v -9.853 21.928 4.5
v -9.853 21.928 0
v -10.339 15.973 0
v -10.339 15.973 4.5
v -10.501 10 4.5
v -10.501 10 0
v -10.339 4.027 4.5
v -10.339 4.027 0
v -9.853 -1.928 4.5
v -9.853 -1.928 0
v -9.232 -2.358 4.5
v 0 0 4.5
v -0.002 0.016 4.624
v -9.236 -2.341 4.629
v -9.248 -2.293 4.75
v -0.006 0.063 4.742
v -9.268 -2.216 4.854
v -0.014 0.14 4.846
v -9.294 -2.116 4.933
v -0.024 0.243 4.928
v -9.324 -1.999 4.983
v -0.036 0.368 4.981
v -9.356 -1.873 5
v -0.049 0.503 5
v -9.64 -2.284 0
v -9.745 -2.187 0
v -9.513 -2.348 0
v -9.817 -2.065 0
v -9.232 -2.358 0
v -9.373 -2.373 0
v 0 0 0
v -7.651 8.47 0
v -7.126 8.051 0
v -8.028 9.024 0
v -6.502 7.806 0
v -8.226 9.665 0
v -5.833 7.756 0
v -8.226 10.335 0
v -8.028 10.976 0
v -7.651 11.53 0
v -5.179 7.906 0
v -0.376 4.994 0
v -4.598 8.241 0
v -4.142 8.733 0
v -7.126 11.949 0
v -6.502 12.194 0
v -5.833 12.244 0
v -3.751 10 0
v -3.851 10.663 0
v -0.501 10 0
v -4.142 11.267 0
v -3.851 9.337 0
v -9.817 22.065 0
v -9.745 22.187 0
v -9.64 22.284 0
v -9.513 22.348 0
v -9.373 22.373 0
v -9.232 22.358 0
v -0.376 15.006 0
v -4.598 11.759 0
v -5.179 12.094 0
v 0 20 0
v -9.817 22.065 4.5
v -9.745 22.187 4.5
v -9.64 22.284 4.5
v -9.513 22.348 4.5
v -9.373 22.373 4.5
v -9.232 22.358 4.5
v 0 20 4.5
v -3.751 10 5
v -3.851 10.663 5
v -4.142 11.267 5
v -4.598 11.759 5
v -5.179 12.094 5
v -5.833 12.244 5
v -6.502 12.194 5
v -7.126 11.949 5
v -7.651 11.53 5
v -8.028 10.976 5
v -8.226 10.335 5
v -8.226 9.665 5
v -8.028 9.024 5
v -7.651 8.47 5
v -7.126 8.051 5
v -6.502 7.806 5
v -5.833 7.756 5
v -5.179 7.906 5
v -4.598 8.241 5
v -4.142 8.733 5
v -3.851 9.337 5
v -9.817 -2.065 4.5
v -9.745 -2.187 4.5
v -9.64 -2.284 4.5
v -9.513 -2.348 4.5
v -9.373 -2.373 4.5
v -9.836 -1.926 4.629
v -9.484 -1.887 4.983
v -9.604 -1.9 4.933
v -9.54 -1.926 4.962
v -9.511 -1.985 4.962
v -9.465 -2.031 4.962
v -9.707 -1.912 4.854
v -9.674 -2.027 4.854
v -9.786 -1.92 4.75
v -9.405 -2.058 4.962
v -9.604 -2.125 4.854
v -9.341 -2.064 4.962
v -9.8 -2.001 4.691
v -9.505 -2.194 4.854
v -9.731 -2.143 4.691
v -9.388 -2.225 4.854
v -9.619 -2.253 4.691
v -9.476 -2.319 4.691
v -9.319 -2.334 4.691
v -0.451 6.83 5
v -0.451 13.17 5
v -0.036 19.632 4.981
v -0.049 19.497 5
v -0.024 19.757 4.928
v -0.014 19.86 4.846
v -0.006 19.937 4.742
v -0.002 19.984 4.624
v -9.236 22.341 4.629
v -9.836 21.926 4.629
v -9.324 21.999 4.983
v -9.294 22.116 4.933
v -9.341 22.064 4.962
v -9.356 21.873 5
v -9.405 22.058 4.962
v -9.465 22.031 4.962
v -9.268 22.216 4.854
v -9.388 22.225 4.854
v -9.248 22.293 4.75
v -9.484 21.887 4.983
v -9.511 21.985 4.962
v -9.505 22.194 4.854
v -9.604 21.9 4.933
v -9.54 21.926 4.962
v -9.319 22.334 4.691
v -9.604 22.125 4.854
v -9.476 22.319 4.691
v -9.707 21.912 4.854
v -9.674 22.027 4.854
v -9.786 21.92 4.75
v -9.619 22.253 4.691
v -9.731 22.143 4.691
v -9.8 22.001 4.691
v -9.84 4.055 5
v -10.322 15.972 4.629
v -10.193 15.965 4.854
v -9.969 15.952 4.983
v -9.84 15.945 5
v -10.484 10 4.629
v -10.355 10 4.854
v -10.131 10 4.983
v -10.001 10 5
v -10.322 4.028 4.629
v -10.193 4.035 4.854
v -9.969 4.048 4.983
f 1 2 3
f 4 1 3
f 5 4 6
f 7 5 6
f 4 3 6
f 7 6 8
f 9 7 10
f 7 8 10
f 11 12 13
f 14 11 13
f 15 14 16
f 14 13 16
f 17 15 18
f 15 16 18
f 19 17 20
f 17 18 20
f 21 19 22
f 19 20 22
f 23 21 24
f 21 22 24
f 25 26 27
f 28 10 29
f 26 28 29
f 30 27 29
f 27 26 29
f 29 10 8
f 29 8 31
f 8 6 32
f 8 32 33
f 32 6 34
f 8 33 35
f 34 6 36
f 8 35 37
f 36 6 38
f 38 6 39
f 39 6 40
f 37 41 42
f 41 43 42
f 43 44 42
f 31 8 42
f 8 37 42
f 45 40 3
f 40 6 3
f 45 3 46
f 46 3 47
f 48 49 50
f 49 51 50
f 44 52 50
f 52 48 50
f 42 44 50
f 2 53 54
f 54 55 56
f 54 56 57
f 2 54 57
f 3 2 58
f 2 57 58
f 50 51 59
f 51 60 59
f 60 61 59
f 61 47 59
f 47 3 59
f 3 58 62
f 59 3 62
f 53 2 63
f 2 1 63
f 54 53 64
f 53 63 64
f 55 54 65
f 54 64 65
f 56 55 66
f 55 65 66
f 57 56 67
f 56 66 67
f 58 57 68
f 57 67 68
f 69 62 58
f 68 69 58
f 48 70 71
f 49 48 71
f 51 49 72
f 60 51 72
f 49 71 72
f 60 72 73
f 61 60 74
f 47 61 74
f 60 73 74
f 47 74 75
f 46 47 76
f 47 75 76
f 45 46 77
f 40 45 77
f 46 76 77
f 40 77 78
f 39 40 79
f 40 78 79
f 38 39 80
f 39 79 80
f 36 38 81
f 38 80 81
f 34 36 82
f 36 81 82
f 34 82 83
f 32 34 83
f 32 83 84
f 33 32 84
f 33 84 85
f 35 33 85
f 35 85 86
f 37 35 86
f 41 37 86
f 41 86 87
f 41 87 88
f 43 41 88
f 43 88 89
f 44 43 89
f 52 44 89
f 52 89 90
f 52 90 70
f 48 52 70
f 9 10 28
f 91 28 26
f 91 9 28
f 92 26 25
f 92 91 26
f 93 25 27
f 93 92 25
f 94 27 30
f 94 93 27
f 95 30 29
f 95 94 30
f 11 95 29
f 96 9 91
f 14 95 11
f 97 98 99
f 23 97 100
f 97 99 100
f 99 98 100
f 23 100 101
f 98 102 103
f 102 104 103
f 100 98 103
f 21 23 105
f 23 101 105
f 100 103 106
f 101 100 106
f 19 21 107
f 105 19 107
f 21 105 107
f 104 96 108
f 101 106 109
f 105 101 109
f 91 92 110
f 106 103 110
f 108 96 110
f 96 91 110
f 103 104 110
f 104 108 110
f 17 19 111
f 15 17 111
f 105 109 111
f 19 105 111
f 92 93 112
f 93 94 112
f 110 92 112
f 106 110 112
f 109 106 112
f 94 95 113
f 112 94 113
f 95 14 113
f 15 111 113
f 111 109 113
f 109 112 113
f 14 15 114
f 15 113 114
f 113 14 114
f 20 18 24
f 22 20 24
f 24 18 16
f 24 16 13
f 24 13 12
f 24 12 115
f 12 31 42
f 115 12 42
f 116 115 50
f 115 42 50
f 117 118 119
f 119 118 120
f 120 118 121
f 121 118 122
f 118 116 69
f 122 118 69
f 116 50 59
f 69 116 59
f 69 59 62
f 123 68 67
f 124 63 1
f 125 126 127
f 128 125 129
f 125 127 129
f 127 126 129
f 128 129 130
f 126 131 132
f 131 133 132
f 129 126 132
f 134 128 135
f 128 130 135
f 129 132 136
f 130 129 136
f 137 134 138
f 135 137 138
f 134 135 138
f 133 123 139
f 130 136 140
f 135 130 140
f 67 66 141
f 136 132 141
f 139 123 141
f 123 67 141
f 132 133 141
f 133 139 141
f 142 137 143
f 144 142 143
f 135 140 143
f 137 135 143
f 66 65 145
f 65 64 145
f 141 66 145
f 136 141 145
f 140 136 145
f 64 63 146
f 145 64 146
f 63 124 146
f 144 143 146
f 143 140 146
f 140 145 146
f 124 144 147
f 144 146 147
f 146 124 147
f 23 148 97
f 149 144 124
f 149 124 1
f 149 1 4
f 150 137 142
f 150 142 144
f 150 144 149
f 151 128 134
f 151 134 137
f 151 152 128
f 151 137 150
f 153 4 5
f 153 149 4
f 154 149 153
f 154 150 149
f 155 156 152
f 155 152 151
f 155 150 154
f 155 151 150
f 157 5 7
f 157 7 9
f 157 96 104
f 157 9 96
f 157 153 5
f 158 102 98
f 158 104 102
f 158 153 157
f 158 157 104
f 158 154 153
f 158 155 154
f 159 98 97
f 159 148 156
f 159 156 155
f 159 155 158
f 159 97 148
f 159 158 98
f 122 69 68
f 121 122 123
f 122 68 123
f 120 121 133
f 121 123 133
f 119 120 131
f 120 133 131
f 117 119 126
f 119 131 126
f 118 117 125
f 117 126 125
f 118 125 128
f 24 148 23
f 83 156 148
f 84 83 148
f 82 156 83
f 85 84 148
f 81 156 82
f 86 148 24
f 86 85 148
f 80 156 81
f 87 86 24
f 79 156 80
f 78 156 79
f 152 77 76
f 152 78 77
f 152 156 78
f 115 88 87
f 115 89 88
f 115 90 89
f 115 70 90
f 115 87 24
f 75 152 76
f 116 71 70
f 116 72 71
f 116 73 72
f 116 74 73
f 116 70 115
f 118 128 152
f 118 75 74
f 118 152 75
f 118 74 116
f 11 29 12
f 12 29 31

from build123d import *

# Parameters (mm, degrees)
F1_DEPTH = 5
F2_R     = 2.25
F3_DEPTH = 25
F4_R     = 0.5


with BuildPart() as f1:
    # F0 (on Top) → F1 (new body)
    with BuildSketch(Plane.XY):
        with BuildLine():
            ThreePointArc((-9.788721, 22.5), (-10.501256, 10), (-9.788721, -2.5))
            Line((-9.788721, -2.5), (0, 0))
            ThreePointArc((0, 0), (-0.501256, 10), (0, 20))
            Line((0, 20), (-9.788721, 22.5))
        make_face()
    extrude(amount=F1_DEPTH)

    # F2 (on face) → F3 (cut)
    with BuildSketch(Plane.XY.offset(5)):
        with Locations((-6.001256, 10)):
            Circle(F2_R)
    extrude(amount=-F3_DEPTH, mode=Mode.SUBTRACT)

    # F4
    f4_edges = [f1.edges().sort_by_distance(p)[0] for p in [
        (-4.894361, -1.25, 5),
        (-9.788721, -2.5, 2.5),
        (-10.501256, 10, 5),
        (-9.788721, 22.5, 2.5),
        (-4.894361, 21.25, 5),
    ]]
    fillet(f4_edges, radius=F4_R)


solid = f1.part
